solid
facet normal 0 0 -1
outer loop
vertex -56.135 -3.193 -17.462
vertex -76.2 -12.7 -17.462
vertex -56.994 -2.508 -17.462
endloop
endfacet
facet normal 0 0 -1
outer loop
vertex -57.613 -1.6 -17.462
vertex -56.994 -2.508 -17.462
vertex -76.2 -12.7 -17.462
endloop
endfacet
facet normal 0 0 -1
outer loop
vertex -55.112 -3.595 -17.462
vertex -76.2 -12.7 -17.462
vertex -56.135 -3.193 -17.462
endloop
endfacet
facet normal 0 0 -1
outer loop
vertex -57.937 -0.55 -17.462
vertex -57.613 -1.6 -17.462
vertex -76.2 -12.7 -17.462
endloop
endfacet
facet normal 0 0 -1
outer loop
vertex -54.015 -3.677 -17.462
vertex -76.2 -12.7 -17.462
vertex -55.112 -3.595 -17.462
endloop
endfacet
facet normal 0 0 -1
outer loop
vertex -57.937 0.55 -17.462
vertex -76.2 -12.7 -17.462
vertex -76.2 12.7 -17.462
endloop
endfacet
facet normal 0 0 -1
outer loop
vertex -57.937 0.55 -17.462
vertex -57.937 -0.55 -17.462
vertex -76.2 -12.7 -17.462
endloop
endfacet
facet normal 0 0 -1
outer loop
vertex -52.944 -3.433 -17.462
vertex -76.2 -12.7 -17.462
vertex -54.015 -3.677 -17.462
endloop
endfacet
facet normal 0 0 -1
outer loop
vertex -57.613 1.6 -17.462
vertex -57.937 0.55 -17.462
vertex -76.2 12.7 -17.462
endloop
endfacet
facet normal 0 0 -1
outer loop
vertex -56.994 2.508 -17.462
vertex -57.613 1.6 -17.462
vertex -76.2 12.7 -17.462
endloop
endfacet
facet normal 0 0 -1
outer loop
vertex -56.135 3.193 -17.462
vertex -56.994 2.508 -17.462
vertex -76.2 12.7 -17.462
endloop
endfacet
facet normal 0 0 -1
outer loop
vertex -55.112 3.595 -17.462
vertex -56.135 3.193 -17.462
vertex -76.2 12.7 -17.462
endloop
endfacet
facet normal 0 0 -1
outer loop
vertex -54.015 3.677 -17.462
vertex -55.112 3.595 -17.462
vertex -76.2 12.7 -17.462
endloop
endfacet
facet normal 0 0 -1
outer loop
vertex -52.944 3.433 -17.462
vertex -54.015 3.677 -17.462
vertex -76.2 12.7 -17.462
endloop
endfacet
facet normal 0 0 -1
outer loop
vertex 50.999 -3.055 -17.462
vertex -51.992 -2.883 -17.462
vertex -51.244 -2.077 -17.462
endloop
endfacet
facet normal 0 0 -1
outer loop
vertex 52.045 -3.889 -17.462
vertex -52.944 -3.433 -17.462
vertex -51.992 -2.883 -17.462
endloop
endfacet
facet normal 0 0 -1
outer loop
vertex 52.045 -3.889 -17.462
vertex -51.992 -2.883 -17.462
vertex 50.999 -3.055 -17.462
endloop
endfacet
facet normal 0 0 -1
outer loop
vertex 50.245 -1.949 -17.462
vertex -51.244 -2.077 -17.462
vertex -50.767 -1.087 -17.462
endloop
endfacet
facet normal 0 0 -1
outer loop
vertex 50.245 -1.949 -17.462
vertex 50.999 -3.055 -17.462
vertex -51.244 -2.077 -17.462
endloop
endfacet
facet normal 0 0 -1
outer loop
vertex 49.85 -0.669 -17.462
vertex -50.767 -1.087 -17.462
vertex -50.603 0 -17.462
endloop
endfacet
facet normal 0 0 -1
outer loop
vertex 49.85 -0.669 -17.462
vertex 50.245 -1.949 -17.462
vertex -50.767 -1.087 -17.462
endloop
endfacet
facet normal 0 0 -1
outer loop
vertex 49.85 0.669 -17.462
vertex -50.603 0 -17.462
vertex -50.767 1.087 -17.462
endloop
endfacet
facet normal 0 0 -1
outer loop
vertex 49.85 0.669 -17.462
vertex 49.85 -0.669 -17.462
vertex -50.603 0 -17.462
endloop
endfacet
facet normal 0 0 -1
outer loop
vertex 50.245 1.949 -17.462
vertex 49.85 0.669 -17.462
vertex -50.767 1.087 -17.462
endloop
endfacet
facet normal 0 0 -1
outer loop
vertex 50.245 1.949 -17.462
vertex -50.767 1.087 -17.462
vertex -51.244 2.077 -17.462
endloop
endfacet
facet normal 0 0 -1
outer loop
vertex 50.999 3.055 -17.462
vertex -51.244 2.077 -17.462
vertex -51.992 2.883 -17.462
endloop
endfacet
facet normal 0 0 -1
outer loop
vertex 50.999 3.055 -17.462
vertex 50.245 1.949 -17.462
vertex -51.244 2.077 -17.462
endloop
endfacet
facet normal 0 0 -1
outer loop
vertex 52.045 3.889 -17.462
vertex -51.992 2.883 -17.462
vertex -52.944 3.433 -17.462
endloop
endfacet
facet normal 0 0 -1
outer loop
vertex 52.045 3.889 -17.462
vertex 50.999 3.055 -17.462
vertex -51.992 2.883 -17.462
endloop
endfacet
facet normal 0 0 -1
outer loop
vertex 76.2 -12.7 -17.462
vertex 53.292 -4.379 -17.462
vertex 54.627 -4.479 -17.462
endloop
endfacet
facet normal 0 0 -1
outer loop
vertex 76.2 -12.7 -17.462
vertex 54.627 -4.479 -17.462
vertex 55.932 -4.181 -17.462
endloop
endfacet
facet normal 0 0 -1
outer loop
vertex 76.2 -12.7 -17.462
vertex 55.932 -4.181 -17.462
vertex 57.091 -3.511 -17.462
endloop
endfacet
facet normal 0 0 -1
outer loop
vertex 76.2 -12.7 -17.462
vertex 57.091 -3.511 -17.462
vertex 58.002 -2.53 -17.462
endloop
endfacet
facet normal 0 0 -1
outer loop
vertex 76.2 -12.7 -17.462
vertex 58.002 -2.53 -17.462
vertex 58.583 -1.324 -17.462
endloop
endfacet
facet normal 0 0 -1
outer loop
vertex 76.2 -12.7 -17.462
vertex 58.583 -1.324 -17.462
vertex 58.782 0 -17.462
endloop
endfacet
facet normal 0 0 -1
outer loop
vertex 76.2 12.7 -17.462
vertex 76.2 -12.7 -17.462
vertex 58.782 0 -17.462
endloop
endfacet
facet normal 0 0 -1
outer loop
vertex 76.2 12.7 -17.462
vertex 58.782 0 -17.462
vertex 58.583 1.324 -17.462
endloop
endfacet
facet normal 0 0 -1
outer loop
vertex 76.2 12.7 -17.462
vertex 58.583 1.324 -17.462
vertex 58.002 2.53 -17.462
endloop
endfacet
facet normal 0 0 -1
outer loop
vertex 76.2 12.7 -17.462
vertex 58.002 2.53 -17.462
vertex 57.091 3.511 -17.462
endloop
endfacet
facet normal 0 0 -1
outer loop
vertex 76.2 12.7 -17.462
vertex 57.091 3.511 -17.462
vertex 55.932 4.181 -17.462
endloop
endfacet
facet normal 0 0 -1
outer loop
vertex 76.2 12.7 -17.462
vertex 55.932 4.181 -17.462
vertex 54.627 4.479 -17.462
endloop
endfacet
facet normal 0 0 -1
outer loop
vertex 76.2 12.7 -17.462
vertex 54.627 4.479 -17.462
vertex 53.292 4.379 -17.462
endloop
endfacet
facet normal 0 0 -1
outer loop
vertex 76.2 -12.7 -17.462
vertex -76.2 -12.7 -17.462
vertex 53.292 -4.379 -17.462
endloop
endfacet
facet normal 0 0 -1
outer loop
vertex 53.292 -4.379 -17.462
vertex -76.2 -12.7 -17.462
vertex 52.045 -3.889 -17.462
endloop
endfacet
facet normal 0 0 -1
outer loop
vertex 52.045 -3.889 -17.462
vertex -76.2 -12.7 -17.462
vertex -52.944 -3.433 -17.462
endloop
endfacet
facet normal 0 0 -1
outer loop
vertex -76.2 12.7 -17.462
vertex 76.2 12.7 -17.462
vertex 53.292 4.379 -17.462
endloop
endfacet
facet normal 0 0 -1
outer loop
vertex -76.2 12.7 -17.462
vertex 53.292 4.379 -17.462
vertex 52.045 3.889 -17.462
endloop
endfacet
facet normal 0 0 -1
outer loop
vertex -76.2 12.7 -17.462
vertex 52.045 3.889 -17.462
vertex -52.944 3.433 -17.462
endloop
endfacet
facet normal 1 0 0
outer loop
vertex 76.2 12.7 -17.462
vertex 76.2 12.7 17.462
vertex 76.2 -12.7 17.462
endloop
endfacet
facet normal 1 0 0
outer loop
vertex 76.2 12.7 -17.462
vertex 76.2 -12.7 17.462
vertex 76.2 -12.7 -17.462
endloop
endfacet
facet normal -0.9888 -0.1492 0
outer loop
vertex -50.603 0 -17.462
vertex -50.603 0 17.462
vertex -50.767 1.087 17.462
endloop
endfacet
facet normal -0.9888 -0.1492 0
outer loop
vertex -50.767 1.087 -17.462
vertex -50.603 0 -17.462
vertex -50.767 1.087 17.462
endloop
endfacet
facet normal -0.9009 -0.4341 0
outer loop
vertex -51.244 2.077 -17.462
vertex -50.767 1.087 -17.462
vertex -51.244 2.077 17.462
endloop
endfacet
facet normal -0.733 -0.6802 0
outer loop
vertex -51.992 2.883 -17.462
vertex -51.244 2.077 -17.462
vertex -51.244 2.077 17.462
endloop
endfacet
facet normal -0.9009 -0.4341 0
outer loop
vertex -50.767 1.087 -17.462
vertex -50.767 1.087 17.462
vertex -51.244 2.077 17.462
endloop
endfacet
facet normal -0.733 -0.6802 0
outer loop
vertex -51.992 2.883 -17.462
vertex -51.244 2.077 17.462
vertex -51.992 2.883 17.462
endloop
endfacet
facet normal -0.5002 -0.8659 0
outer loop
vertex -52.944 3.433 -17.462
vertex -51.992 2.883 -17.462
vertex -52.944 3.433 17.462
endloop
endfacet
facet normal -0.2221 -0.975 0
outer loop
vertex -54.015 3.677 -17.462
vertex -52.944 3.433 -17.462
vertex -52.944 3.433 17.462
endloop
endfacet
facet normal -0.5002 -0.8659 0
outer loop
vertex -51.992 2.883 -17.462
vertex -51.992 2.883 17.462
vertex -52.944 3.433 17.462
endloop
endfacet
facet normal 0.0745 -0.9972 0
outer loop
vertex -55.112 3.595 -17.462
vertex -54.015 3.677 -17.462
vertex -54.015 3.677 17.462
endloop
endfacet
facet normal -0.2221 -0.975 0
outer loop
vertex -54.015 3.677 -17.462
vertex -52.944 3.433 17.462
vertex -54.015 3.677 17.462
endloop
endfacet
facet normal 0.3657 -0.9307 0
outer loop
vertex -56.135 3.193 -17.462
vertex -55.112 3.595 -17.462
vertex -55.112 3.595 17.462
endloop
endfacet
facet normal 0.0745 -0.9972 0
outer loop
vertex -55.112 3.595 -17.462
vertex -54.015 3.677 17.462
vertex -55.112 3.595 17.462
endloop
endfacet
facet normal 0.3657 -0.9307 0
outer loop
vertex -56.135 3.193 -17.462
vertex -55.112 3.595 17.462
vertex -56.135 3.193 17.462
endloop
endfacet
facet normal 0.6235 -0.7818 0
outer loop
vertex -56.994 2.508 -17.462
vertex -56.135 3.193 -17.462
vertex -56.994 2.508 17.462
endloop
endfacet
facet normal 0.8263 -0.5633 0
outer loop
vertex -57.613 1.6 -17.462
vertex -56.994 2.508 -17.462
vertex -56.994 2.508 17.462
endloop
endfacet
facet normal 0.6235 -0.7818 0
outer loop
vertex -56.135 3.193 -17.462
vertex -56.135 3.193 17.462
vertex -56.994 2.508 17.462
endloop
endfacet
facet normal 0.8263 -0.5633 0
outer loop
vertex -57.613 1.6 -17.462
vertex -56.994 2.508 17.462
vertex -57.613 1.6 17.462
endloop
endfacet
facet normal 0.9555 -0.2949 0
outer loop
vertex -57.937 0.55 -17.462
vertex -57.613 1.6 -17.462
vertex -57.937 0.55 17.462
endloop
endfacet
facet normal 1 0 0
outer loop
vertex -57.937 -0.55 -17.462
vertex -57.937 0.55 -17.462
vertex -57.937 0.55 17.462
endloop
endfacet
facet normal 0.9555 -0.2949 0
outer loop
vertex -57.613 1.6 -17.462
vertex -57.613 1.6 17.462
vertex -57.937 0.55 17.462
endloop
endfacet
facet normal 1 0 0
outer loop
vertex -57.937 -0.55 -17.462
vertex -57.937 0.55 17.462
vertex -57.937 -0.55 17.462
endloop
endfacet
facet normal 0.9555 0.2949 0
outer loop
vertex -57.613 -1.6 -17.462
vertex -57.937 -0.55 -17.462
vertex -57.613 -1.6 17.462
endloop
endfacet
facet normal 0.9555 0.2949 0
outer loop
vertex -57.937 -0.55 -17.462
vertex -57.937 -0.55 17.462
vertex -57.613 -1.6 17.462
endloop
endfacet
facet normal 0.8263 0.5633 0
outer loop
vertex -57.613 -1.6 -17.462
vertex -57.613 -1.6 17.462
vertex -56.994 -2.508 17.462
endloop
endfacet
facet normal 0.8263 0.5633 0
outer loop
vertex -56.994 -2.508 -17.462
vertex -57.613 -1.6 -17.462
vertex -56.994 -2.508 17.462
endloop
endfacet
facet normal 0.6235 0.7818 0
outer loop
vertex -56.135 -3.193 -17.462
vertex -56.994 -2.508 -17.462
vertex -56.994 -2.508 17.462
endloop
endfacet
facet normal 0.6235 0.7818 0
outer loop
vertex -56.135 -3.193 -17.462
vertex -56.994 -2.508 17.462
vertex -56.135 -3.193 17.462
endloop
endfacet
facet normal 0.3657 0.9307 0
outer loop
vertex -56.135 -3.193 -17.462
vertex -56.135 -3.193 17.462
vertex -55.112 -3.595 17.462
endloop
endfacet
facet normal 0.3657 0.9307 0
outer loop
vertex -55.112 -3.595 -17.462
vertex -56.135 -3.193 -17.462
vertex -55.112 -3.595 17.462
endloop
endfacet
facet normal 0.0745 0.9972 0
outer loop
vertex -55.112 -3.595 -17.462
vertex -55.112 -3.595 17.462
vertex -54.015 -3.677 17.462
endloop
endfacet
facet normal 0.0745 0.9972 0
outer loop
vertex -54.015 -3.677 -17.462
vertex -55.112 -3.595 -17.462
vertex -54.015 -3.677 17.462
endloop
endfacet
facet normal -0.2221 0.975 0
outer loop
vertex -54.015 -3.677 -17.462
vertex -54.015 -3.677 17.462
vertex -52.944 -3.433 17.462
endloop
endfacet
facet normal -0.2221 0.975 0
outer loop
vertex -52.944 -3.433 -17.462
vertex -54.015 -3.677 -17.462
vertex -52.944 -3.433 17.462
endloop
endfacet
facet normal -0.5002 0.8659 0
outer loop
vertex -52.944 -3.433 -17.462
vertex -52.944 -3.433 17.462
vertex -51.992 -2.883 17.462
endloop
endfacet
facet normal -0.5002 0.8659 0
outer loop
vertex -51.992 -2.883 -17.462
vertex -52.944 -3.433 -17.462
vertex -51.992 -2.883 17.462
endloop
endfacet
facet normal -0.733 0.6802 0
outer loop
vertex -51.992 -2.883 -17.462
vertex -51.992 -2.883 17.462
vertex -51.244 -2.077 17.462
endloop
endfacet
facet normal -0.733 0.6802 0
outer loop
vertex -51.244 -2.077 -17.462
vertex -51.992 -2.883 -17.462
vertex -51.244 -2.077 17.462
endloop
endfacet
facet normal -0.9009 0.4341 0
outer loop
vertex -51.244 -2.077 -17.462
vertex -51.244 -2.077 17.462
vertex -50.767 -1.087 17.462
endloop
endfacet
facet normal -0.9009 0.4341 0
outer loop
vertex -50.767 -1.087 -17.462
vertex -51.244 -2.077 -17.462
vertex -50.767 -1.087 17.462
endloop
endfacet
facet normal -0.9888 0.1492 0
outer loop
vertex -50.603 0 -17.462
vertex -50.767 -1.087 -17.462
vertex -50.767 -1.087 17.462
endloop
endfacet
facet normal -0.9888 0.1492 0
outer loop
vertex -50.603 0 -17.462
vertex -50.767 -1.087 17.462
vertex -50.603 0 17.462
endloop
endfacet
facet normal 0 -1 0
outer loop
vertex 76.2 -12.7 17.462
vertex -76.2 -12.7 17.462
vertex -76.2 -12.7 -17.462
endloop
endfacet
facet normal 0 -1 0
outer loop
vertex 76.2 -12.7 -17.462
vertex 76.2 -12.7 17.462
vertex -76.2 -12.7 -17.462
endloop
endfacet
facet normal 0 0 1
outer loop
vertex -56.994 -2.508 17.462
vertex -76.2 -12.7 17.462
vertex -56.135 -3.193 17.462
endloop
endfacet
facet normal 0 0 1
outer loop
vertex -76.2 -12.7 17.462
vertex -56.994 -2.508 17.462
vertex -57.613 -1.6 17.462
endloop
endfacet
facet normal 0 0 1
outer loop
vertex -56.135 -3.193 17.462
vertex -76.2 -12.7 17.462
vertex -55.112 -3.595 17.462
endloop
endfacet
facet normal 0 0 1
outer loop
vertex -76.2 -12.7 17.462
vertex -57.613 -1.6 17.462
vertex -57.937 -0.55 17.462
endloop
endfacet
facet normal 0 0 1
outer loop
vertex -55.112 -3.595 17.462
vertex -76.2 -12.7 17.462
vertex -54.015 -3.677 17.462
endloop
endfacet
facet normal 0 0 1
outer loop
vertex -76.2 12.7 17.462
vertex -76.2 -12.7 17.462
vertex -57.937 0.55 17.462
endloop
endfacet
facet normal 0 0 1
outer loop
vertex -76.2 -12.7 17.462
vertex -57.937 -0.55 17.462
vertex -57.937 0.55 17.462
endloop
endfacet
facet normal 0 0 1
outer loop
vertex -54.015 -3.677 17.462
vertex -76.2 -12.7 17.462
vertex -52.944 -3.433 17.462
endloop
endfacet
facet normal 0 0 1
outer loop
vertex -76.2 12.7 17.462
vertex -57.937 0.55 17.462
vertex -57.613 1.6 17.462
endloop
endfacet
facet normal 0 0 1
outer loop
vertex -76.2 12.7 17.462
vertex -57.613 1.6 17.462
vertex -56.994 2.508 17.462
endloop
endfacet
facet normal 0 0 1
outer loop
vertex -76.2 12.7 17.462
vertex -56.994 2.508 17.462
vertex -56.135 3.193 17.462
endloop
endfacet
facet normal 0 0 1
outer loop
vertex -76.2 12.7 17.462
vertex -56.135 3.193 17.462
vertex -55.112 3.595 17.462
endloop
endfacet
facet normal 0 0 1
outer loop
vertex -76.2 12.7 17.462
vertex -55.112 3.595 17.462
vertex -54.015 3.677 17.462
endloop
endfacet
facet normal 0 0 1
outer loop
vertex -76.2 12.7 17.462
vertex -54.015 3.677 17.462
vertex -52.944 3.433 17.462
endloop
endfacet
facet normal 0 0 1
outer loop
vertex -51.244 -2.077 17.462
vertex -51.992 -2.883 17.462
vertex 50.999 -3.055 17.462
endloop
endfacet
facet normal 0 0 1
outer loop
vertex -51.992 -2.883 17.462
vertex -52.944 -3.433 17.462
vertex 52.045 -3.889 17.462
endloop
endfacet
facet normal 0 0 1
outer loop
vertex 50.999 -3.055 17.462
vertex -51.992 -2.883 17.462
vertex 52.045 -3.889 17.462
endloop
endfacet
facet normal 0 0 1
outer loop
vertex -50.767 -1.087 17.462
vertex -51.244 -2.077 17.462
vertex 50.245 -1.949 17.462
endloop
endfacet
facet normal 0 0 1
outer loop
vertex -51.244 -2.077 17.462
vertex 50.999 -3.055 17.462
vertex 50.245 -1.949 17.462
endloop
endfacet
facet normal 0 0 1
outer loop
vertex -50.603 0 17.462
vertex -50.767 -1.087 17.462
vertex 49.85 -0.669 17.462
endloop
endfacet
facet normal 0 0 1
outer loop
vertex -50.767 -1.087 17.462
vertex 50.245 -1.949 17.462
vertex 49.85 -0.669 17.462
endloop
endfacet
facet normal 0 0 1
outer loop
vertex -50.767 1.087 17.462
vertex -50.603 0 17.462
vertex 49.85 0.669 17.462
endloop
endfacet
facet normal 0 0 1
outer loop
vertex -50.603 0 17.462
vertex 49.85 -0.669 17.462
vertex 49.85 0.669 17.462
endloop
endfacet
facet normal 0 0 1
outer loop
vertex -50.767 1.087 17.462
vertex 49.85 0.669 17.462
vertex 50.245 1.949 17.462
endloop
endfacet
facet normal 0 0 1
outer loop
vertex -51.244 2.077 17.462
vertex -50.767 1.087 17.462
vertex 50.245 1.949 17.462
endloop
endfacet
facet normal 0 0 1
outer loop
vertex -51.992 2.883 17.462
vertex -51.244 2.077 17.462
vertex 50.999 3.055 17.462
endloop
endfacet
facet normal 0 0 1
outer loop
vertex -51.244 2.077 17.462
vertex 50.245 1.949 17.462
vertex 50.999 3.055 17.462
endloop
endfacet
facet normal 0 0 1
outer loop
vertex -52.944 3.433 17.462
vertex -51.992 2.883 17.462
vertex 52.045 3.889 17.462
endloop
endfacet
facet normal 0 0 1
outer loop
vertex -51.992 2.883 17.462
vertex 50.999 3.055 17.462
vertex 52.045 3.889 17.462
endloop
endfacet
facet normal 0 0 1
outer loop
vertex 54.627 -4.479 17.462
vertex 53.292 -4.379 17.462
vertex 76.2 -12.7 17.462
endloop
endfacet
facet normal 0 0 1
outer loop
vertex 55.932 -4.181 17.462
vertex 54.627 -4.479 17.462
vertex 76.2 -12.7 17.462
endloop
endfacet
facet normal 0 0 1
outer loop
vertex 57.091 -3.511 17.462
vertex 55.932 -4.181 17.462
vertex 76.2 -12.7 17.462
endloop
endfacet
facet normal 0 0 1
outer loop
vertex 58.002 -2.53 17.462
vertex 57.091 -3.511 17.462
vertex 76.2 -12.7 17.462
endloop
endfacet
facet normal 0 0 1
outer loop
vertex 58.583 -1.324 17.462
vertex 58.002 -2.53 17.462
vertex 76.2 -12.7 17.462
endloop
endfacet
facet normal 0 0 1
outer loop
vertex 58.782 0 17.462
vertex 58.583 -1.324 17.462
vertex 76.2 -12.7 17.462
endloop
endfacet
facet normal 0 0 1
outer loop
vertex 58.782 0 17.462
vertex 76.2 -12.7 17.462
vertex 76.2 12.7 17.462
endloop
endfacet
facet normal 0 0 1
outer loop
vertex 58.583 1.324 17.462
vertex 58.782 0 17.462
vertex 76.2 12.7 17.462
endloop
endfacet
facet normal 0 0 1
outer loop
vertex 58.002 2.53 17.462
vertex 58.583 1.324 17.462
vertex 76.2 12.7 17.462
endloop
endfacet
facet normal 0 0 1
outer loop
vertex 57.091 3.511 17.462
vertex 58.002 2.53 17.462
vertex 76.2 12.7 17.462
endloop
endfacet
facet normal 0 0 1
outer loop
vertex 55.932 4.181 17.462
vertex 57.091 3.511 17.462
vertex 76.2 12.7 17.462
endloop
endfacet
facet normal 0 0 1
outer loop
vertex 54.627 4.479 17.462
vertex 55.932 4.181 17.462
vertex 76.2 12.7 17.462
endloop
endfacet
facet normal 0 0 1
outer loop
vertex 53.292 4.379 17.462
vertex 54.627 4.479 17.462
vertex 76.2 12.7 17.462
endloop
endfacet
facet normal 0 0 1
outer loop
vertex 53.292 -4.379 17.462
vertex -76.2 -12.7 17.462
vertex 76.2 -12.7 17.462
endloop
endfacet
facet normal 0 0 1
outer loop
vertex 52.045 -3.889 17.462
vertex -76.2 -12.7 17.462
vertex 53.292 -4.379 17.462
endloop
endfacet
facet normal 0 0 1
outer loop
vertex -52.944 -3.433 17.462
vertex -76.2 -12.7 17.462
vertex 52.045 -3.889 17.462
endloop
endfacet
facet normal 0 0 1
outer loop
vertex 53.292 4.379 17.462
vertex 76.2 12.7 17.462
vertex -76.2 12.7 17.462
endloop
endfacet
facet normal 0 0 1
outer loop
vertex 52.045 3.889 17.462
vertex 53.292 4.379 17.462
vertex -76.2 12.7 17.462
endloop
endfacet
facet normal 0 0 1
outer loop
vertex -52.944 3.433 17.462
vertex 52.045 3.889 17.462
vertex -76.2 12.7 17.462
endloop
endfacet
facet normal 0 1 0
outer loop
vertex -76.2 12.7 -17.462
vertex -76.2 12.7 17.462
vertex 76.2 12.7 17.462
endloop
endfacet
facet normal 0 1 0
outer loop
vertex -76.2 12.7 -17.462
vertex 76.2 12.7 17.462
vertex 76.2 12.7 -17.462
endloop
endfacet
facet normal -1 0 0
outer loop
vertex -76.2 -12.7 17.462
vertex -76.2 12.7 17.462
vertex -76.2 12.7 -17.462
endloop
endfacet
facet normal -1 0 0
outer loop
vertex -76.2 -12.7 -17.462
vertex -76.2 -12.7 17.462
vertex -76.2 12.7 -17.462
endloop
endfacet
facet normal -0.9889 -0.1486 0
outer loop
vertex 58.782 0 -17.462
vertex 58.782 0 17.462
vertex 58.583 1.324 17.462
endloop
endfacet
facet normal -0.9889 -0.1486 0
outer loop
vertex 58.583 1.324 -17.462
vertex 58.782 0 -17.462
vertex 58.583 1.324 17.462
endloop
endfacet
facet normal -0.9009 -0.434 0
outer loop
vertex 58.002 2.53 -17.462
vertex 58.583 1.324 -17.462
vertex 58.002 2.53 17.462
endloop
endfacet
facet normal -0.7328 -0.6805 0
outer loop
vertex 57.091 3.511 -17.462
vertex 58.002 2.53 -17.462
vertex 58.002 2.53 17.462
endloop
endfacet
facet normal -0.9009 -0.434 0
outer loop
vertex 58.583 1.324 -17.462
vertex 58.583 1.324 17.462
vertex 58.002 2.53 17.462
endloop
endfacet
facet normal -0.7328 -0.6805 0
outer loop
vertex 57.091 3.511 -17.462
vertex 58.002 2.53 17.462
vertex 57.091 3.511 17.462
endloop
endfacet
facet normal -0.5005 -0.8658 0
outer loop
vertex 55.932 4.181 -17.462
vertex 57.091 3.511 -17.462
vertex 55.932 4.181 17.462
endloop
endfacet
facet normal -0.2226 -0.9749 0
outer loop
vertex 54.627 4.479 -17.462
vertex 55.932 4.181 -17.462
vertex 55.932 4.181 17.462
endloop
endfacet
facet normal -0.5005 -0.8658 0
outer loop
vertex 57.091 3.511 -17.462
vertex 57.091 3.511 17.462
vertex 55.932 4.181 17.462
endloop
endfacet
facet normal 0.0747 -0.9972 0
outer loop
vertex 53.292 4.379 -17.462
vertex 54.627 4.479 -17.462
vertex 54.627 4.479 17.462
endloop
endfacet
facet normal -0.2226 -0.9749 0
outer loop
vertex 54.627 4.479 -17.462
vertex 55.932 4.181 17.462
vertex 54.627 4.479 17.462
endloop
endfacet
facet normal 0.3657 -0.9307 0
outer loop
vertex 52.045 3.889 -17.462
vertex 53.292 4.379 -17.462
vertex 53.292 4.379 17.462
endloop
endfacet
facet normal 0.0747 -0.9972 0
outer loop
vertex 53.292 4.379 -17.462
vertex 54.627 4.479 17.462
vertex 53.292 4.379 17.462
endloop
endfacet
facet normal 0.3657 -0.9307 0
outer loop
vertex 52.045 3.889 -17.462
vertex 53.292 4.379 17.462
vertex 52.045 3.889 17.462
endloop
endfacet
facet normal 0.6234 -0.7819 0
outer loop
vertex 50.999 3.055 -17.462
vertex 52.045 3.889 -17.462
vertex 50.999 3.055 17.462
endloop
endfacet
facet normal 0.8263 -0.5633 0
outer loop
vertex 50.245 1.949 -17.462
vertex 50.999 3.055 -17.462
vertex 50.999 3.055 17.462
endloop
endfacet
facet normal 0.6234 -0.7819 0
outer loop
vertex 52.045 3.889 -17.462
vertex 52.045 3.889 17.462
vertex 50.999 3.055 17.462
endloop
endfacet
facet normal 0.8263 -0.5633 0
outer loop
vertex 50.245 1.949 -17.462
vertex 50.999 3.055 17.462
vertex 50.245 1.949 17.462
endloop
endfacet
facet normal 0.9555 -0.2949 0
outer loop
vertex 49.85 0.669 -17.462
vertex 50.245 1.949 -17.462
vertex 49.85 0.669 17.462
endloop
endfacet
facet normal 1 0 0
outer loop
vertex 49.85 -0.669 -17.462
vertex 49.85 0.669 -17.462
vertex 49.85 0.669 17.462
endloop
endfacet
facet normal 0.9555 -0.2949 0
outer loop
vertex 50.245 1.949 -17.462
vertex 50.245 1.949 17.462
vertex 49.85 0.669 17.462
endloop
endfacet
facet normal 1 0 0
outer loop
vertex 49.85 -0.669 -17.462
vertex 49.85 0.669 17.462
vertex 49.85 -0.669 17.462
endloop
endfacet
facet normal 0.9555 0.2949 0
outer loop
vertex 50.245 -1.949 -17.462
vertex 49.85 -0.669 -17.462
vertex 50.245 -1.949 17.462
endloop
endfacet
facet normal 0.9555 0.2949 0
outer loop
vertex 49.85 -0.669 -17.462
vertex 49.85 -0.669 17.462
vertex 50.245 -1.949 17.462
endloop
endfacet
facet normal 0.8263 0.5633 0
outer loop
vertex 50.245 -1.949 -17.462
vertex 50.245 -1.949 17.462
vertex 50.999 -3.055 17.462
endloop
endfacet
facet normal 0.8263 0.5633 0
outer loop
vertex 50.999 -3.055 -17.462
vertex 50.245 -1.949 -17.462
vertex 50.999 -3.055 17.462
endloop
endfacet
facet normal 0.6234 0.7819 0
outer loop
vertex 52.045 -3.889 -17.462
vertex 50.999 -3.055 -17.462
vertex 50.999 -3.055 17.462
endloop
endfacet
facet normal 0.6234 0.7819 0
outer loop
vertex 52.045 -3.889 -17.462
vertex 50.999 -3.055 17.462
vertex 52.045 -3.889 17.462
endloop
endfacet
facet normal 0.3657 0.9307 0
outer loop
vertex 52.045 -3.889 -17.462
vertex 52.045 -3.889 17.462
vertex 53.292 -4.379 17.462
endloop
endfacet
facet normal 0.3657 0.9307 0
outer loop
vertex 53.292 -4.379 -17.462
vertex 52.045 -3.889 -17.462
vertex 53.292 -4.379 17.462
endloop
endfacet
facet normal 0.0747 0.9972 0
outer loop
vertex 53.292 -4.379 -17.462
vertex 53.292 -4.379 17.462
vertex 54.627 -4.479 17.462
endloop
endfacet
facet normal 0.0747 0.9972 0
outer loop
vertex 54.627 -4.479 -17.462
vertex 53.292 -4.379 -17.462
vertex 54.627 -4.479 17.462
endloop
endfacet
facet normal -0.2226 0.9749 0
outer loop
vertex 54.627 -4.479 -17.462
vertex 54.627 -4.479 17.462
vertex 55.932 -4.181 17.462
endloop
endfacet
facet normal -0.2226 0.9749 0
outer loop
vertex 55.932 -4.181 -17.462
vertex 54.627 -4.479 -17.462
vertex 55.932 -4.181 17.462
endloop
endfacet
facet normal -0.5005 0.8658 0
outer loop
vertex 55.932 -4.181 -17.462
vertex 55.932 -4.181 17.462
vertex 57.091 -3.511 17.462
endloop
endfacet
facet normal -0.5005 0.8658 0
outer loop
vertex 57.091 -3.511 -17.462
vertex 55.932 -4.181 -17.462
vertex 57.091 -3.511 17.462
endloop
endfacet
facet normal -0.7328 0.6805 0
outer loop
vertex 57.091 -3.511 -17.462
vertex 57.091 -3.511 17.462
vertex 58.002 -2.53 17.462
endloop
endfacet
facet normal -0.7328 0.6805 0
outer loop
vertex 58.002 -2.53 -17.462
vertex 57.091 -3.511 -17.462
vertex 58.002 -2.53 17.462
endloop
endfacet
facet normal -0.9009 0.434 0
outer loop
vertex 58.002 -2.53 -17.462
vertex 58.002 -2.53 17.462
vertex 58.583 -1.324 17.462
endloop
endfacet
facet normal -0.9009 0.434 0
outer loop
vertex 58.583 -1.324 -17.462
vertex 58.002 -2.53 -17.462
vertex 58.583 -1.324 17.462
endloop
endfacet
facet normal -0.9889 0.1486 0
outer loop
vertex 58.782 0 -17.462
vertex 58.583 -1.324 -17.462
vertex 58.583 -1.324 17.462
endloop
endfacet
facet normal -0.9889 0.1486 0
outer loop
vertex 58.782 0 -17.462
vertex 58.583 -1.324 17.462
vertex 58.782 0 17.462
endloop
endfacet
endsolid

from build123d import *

# Parameters (mm, degrees)
SKETCH1_W           = 34.925
SKETCH1_H           = 25.4
BOSS_EXTRUDE1_DEPTH = 76.2
SKETCH2_R           = 3.687507865
SKETCH2_R_2         = 4.491133618
CUT_EXTRUDE1_DEPTH  = 85.77904001


with BuildPart() as part:
    # Sketch1 → Boss-Extrude1 (new, symmetric)
    with BuildSketch(Plane(origin=(0, 0, 0), x_dir=(0, 0, -1), z_dir=(1, 0, 0))):
        Rectangle(SKETCH1_W, SKETCH1_H)
    extrude(amount=BOSS_EXTRUDE1_DEPTH, both=True)

    # Sketch2 → Cut-Extrude1 (cut, through all)
    with BuildSketch(Plane.XY.offset(17.4625)):
        with Locations((-54.290984638, 0)):
            Circle(SKETCH2_R)
        with Locations((54.290984638, 0)):
            Circle(SKETCH2_R_2)
    extrude(amount=-CUT_EXTRUDE1_DEPTH, mode=Mode.SUBTRACT)


solid = part.part
